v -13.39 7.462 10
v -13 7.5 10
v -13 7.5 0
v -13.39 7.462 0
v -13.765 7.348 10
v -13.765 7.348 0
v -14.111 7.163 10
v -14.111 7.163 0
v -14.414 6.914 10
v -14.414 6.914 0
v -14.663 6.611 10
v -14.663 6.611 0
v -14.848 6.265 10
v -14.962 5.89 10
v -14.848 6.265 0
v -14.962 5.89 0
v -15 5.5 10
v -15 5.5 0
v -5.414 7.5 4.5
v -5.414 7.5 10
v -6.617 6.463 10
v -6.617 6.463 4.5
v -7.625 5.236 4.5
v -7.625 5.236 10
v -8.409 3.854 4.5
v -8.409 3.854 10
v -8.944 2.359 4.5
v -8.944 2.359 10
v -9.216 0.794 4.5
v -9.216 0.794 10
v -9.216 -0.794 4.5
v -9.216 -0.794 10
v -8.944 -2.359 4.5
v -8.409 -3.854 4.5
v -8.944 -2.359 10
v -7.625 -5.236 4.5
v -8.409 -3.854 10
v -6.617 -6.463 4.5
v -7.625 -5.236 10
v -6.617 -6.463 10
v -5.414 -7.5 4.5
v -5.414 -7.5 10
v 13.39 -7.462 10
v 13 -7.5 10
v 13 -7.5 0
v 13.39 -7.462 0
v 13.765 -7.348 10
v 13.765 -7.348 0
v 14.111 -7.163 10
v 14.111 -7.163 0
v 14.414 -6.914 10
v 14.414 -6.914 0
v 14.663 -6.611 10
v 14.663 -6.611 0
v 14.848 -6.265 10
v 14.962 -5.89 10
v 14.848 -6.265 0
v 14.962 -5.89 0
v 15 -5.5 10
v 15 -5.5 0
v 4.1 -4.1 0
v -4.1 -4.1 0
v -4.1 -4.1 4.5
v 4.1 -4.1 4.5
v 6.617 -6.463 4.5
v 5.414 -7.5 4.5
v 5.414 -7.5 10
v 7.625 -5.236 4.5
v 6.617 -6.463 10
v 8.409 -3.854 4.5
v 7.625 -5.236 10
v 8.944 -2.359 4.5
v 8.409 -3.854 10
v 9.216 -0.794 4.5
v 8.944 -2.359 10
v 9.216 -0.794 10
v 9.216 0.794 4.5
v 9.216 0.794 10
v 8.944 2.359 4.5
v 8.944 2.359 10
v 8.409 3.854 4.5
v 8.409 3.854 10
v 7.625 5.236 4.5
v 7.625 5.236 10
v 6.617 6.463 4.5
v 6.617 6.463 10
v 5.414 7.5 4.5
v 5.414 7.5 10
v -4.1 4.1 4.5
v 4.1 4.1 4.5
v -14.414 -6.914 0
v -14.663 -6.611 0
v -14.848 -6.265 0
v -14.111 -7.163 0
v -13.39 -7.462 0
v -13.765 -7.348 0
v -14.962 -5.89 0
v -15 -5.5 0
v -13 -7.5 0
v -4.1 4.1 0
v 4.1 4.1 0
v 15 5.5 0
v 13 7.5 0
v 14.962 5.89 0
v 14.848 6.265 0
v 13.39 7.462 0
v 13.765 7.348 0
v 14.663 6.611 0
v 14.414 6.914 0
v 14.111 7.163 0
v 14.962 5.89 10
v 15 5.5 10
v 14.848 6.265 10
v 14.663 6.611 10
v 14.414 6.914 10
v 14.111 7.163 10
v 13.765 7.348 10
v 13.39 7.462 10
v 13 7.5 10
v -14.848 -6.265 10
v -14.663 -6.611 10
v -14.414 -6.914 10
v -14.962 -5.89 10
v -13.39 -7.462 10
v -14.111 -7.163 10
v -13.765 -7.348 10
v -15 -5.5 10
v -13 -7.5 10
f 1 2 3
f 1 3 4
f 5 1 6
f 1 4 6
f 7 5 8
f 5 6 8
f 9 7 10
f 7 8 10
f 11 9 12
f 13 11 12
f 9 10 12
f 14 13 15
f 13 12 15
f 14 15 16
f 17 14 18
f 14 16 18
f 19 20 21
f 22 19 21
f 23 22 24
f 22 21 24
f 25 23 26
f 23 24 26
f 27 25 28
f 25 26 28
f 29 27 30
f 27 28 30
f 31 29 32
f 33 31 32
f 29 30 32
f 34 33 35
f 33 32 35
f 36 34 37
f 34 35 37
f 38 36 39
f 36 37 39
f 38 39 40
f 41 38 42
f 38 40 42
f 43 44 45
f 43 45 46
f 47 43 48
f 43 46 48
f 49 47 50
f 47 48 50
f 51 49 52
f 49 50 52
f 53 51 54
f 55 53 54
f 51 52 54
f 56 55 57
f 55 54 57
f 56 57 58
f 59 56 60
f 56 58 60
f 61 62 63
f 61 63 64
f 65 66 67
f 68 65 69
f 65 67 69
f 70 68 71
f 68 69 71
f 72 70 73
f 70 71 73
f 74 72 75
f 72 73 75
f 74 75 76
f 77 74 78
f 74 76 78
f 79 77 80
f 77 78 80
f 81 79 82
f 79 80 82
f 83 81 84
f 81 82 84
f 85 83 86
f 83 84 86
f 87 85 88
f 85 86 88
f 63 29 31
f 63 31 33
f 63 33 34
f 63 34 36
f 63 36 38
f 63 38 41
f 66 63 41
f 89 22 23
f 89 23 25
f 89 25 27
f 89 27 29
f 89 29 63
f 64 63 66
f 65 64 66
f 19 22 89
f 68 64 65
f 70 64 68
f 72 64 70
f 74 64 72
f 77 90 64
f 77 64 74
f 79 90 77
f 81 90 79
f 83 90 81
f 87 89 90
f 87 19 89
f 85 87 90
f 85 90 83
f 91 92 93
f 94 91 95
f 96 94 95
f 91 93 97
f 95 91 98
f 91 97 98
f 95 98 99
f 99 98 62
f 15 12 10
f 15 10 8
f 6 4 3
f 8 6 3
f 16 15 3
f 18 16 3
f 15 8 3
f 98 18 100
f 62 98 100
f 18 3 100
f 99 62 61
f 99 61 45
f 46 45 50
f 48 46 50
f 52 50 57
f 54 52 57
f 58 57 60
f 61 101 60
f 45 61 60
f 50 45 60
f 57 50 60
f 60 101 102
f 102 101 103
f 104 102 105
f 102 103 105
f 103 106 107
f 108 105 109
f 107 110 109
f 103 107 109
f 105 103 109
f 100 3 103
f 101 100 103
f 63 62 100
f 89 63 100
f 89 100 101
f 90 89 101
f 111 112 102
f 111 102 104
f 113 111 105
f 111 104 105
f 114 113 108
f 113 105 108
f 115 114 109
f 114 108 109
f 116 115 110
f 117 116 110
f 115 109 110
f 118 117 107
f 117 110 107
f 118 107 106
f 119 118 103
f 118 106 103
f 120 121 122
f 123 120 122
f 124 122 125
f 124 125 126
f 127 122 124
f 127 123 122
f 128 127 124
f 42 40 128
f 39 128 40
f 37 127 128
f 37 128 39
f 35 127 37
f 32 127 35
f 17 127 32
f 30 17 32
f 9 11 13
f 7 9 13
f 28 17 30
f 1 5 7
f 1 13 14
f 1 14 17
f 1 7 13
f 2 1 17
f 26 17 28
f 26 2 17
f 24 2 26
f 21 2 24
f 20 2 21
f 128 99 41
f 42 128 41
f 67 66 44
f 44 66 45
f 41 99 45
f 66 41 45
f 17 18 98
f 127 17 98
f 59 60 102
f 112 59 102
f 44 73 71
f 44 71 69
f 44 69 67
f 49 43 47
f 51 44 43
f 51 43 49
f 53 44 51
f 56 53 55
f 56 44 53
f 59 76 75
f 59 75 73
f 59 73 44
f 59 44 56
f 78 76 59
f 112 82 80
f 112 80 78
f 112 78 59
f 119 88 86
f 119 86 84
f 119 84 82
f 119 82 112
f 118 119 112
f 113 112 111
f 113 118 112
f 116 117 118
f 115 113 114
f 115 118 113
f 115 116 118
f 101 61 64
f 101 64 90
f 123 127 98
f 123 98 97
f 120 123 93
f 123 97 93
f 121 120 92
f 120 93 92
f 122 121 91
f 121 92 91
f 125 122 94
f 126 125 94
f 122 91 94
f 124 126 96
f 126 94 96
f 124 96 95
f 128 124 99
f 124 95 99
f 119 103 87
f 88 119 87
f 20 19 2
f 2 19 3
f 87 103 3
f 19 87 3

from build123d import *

# Parameters (mm, degrees)
F0_W     = 8.2
F0_H     = 8.2
F1_DEPTH = 10
F2_R     = 9.25
F3_DEPTH = 5.5


with BuildPart() as f1:
    # F0 (on Top) → F1 (new body)
    with BuildSketch(Plane.XY):
        with BuildLine():
            ThreePointArc((15, 5.5), (14.414214, 6.914214), (13, 7.5))
            Line((13, 7.5), (-13, 7.5))
            ThreePointArc((-13, 7.5), (-14.414214, 6.914214), (-15, 5.5))
            Line((-15, 5.5), (-15, -5.5))
            ThreePointArc((-15, -5.5), (-14.414214, -6.914214), (-13, -7.5))
            Line((-13, -7.5), (13, -7.5))
            ThreePointArc((13, -7.5), (14.414214, -6.914214), (15, -5.5))
            Line((15, -5.5), (15, 5.5))
        make_face()
        Rectangle(F0_W, F0_H, mode=Mode.SUBTRACT)
    extrude(amount=F1_DEPTH)

    # F2 (on face) → F3 (cut)
    with BuildSketch(Plane.XY.offset(10)):
        Circle(F2_R)
    extrude(amount=-F3_DEPTH, mode=Mode.SUBTRACT)


solid = f1.part
